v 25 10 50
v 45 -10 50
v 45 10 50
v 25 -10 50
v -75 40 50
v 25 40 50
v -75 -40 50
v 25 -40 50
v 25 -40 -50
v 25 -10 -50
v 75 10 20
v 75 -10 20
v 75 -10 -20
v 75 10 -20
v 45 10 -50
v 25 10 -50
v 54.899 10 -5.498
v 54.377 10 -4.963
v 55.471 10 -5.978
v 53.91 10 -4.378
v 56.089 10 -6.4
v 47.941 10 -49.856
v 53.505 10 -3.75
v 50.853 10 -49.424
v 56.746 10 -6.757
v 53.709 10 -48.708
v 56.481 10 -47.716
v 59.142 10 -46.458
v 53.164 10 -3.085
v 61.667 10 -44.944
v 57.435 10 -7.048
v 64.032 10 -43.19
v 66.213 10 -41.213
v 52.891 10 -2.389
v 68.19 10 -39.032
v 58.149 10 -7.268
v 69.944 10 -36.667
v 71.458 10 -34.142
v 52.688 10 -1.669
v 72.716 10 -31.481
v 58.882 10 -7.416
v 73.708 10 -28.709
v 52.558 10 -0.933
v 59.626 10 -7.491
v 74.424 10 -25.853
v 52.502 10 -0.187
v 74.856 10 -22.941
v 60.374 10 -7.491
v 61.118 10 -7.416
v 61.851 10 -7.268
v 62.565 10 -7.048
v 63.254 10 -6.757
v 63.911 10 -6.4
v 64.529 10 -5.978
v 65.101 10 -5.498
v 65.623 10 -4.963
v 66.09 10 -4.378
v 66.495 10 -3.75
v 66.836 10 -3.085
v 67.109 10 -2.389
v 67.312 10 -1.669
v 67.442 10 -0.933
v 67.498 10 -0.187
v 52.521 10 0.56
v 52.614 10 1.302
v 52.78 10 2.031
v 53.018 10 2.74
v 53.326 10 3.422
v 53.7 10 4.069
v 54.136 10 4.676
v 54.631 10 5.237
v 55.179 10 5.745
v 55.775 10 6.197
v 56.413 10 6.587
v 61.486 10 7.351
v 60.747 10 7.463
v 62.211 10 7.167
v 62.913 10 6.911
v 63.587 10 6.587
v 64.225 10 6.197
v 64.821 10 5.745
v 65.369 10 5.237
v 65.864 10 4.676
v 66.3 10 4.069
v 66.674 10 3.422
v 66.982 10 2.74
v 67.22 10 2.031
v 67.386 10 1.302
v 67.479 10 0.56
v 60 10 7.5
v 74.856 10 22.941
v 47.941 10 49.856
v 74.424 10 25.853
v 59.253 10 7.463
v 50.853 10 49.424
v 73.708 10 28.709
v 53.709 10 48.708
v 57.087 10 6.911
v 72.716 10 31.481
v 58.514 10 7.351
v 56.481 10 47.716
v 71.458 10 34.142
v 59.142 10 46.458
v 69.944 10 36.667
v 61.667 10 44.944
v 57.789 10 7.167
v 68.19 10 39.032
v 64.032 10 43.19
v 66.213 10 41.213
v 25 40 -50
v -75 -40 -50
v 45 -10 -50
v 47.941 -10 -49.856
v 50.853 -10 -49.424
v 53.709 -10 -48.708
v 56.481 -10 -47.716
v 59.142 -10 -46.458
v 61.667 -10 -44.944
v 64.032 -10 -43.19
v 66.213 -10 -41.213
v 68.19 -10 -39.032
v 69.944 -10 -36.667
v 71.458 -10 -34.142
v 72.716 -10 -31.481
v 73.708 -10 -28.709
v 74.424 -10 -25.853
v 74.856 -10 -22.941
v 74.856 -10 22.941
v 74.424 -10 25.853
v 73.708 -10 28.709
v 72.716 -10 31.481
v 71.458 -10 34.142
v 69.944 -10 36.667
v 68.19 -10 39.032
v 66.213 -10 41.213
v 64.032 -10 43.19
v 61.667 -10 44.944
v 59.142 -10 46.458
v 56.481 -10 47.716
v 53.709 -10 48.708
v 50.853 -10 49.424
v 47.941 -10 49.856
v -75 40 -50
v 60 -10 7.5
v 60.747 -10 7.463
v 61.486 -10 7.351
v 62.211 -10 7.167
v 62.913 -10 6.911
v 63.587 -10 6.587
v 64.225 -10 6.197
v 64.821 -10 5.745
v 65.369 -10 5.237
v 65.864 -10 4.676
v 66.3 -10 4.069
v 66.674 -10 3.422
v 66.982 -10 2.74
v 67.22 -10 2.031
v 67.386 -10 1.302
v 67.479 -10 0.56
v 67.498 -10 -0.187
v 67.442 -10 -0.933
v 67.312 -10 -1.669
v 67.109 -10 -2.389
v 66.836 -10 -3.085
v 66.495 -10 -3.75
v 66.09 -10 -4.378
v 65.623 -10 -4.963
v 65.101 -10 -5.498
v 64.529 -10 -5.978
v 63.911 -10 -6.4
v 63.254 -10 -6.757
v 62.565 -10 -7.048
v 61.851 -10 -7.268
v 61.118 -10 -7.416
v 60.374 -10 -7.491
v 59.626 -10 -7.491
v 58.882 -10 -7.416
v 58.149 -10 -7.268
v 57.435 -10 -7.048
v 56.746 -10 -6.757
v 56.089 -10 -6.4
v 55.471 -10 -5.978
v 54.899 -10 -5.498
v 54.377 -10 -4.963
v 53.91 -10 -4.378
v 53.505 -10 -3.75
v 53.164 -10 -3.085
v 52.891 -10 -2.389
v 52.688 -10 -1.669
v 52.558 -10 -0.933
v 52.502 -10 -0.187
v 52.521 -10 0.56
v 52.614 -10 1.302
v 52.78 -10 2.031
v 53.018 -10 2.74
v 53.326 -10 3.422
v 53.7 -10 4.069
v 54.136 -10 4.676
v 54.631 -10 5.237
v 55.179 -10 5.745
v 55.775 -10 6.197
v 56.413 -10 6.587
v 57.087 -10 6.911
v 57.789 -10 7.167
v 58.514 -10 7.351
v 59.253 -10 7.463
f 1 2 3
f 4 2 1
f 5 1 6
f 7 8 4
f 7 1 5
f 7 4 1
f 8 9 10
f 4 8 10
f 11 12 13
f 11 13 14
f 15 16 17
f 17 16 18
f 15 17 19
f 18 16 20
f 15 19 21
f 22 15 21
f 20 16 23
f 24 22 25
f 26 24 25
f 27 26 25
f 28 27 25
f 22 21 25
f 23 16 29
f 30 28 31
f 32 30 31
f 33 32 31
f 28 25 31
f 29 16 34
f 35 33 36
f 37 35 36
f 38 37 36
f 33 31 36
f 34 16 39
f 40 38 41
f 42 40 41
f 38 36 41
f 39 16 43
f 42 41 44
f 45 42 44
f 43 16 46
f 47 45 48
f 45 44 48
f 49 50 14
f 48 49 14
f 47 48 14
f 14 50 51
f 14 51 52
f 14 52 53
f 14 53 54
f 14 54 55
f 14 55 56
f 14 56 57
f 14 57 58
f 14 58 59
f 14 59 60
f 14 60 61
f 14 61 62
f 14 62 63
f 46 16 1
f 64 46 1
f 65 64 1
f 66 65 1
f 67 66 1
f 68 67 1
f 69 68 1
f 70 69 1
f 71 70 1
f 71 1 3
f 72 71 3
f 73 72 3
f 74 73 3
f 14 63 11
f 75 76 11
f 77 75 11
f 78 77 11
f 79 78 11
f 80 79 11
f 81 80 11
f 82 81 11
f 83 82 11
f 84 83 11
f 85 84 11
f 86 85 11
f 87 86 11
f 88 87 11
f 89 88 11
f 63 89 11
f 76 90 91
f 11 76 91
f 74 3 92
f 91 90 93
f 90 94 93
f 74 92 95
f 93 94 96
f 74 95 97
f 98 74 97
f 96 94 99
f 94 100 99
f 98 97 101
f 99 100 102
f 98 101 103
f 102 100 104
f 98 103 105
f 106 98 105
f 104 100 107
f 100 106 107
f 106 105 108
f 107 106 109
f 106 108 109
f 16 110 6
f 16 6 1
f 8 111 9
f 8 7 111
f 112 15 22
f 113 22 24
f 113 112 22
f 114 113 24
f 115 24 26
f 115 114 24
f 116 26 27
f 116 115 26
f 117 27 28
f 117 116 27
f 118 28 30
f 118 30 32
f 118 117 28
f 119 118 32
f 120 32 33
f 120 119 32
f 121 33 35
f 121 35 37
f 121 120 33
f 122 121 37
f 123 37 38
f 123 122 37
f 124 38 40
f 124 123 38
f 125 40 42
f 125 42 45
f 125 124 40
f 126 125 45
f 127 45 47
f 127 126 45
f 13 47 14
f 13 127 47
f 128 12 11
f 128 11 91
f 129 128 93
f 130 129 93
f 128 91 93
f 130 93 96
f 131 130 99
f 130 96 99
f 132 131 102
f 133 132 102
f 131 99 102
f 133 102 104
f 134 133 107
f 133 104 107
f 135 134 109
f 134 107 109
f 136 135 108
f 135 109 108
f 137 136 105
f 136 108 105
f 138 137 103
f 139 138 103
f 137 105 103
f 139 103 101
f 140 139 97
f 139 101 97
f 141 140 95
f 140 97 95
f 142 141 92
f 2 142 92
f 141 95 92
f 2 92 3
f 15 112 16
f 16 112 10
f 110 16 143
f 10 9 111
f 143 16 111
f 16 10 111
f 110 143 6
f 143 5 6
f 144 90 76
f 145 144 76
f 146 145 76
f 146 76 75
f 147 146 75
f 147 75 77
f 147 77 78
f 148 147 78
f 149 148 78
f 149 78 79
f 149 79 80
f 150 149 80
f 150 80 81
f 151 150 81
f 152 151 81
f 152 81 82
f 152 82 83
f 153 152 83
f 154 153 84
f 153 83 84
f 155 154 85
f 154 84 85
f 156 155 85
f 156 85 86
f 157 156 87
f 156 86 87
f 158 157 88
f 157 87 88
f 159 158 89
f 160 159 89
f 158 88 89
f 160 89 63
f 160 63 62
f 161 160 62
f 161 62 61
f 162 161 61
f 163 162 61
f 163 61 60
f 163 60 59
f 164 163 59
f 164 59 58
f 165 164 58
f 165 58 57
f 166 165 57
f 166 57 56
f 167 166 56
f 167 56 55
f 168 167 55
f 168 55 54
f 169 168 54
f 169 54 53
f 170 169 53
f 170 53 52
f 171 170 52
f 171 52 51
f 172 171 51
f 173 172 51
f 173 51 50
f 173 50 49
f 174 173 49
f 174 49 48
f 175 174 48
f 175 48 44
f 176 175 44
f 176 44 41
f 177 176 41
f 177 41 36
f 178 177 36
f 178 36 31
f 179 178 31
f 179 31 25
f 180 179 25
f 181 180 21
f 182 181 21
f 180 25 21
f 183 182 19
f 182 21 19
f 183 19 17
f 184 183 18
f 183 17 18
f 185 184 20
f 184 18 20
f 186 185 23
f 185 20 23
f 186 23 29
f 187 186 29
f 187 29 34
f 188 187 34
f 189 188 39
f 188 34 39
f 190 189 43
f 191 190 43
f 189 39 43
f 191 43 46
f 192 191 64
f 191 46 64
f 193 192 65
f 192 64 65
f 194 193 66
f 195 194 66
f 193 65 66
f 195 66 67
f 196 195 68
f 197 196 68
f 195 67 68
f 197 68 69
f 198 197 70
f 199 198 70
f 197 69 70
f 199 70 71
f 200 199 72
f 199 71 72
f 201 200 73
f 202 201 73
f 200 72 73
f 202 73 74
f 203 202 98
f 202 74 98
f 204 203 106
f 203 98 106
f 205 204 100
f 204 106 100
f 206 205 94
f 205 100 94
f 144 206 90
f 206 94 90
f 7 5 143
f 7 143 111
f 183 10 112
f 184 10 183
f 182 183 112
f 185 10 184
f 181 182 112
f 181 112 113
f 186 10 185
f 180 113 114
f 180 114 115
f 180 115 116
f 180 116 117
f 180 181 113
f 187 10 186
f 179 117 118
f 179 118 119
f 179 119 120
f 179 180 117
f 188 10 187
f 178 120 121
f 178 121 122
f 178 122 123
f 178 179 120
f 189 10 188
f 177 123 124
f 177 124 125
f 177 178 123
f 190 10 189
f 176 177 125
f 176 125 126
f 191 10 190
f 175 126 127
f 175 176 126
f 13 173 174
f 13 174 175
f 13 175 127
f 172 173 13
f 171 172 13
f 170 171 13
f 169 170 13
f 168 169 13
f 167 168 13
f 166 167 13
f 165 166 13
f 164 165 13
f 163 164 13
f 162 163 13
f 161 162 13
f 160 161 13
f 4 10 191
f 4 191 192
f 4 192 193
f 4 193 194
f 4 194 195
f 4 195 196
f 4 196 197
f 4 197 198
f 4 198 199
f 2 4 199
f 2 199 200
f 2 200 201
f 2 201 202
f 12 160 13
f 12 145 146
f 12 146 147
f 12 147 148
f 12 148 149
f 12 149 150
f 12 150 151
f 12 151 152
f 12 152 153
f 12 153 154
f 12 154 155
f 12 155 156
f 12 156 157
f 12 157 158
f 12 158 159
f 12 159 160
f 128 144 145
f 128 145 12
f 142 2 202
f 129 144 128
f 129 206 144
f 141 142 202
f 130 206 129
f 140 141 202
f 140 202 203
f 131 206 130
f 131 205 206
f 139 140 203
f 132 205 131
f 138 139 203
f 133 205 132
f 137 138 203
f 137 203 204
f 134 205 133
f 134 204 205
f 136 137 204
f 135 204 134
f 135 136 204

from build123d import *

# Parameters (mm, degrees)
BOSS_EXTRUDE1_DEPTH = 50
SKETCH2_R           = 7.5
CUT_EXTRUDE1_DEPTH  = 104.07764064
FILLET1_R           = 30
FILLET2_R           = 30


with BuildPart() as part:
    # Sketch1 → Boss-Extrude1 (new, symmetric)
    with BuildSketch(Plane.XY):
        Polygon((0, 0), (-75, 0), (-75, 40), (25, 40), (25, 10), (75, 10), (75, 0), align=None)
    boss_extrude1 = extrude(amount=BOSS_EXTRUDE1_DEPTH, both=True)

    # Mirror1: Boss-Extrude1 across plane
    add(boss_extrude1.mirror(Plane(origin=(0, 0, -50), x_dir=(0, 0, 1), z_dir=(0, -1, 0))))

    # Sketch2 → Cut-Extrude1 (cut, through all)
    with BuildSketch(Plane(origin=(0, 10, 0), x_dir=(1, 0, 0), z_dir=(0, 1, 0))):
        with Locations((60, 0)):
            Circle(SKETCH2_R)
    extrude(amount=-CUT_EXTRUDE1_DEPTH, mode=Mode.SUBTRACT)

    # Fillet1
    fillet1_edges = [part.edges().sort_by_distance(p)[0] for p in [
        (75, 0, -50),
    ]]
    fillet(fillet1_edges, radius=FILLET1_R)

    # Fillet2
    fillet2_edges = [part.edges().sort_by_distance(p)[0] for p in [
        (75, 0, 50),
    ]]
    fillet(fillet2_edges, radius=FILLET2_R)


solid = part.part
